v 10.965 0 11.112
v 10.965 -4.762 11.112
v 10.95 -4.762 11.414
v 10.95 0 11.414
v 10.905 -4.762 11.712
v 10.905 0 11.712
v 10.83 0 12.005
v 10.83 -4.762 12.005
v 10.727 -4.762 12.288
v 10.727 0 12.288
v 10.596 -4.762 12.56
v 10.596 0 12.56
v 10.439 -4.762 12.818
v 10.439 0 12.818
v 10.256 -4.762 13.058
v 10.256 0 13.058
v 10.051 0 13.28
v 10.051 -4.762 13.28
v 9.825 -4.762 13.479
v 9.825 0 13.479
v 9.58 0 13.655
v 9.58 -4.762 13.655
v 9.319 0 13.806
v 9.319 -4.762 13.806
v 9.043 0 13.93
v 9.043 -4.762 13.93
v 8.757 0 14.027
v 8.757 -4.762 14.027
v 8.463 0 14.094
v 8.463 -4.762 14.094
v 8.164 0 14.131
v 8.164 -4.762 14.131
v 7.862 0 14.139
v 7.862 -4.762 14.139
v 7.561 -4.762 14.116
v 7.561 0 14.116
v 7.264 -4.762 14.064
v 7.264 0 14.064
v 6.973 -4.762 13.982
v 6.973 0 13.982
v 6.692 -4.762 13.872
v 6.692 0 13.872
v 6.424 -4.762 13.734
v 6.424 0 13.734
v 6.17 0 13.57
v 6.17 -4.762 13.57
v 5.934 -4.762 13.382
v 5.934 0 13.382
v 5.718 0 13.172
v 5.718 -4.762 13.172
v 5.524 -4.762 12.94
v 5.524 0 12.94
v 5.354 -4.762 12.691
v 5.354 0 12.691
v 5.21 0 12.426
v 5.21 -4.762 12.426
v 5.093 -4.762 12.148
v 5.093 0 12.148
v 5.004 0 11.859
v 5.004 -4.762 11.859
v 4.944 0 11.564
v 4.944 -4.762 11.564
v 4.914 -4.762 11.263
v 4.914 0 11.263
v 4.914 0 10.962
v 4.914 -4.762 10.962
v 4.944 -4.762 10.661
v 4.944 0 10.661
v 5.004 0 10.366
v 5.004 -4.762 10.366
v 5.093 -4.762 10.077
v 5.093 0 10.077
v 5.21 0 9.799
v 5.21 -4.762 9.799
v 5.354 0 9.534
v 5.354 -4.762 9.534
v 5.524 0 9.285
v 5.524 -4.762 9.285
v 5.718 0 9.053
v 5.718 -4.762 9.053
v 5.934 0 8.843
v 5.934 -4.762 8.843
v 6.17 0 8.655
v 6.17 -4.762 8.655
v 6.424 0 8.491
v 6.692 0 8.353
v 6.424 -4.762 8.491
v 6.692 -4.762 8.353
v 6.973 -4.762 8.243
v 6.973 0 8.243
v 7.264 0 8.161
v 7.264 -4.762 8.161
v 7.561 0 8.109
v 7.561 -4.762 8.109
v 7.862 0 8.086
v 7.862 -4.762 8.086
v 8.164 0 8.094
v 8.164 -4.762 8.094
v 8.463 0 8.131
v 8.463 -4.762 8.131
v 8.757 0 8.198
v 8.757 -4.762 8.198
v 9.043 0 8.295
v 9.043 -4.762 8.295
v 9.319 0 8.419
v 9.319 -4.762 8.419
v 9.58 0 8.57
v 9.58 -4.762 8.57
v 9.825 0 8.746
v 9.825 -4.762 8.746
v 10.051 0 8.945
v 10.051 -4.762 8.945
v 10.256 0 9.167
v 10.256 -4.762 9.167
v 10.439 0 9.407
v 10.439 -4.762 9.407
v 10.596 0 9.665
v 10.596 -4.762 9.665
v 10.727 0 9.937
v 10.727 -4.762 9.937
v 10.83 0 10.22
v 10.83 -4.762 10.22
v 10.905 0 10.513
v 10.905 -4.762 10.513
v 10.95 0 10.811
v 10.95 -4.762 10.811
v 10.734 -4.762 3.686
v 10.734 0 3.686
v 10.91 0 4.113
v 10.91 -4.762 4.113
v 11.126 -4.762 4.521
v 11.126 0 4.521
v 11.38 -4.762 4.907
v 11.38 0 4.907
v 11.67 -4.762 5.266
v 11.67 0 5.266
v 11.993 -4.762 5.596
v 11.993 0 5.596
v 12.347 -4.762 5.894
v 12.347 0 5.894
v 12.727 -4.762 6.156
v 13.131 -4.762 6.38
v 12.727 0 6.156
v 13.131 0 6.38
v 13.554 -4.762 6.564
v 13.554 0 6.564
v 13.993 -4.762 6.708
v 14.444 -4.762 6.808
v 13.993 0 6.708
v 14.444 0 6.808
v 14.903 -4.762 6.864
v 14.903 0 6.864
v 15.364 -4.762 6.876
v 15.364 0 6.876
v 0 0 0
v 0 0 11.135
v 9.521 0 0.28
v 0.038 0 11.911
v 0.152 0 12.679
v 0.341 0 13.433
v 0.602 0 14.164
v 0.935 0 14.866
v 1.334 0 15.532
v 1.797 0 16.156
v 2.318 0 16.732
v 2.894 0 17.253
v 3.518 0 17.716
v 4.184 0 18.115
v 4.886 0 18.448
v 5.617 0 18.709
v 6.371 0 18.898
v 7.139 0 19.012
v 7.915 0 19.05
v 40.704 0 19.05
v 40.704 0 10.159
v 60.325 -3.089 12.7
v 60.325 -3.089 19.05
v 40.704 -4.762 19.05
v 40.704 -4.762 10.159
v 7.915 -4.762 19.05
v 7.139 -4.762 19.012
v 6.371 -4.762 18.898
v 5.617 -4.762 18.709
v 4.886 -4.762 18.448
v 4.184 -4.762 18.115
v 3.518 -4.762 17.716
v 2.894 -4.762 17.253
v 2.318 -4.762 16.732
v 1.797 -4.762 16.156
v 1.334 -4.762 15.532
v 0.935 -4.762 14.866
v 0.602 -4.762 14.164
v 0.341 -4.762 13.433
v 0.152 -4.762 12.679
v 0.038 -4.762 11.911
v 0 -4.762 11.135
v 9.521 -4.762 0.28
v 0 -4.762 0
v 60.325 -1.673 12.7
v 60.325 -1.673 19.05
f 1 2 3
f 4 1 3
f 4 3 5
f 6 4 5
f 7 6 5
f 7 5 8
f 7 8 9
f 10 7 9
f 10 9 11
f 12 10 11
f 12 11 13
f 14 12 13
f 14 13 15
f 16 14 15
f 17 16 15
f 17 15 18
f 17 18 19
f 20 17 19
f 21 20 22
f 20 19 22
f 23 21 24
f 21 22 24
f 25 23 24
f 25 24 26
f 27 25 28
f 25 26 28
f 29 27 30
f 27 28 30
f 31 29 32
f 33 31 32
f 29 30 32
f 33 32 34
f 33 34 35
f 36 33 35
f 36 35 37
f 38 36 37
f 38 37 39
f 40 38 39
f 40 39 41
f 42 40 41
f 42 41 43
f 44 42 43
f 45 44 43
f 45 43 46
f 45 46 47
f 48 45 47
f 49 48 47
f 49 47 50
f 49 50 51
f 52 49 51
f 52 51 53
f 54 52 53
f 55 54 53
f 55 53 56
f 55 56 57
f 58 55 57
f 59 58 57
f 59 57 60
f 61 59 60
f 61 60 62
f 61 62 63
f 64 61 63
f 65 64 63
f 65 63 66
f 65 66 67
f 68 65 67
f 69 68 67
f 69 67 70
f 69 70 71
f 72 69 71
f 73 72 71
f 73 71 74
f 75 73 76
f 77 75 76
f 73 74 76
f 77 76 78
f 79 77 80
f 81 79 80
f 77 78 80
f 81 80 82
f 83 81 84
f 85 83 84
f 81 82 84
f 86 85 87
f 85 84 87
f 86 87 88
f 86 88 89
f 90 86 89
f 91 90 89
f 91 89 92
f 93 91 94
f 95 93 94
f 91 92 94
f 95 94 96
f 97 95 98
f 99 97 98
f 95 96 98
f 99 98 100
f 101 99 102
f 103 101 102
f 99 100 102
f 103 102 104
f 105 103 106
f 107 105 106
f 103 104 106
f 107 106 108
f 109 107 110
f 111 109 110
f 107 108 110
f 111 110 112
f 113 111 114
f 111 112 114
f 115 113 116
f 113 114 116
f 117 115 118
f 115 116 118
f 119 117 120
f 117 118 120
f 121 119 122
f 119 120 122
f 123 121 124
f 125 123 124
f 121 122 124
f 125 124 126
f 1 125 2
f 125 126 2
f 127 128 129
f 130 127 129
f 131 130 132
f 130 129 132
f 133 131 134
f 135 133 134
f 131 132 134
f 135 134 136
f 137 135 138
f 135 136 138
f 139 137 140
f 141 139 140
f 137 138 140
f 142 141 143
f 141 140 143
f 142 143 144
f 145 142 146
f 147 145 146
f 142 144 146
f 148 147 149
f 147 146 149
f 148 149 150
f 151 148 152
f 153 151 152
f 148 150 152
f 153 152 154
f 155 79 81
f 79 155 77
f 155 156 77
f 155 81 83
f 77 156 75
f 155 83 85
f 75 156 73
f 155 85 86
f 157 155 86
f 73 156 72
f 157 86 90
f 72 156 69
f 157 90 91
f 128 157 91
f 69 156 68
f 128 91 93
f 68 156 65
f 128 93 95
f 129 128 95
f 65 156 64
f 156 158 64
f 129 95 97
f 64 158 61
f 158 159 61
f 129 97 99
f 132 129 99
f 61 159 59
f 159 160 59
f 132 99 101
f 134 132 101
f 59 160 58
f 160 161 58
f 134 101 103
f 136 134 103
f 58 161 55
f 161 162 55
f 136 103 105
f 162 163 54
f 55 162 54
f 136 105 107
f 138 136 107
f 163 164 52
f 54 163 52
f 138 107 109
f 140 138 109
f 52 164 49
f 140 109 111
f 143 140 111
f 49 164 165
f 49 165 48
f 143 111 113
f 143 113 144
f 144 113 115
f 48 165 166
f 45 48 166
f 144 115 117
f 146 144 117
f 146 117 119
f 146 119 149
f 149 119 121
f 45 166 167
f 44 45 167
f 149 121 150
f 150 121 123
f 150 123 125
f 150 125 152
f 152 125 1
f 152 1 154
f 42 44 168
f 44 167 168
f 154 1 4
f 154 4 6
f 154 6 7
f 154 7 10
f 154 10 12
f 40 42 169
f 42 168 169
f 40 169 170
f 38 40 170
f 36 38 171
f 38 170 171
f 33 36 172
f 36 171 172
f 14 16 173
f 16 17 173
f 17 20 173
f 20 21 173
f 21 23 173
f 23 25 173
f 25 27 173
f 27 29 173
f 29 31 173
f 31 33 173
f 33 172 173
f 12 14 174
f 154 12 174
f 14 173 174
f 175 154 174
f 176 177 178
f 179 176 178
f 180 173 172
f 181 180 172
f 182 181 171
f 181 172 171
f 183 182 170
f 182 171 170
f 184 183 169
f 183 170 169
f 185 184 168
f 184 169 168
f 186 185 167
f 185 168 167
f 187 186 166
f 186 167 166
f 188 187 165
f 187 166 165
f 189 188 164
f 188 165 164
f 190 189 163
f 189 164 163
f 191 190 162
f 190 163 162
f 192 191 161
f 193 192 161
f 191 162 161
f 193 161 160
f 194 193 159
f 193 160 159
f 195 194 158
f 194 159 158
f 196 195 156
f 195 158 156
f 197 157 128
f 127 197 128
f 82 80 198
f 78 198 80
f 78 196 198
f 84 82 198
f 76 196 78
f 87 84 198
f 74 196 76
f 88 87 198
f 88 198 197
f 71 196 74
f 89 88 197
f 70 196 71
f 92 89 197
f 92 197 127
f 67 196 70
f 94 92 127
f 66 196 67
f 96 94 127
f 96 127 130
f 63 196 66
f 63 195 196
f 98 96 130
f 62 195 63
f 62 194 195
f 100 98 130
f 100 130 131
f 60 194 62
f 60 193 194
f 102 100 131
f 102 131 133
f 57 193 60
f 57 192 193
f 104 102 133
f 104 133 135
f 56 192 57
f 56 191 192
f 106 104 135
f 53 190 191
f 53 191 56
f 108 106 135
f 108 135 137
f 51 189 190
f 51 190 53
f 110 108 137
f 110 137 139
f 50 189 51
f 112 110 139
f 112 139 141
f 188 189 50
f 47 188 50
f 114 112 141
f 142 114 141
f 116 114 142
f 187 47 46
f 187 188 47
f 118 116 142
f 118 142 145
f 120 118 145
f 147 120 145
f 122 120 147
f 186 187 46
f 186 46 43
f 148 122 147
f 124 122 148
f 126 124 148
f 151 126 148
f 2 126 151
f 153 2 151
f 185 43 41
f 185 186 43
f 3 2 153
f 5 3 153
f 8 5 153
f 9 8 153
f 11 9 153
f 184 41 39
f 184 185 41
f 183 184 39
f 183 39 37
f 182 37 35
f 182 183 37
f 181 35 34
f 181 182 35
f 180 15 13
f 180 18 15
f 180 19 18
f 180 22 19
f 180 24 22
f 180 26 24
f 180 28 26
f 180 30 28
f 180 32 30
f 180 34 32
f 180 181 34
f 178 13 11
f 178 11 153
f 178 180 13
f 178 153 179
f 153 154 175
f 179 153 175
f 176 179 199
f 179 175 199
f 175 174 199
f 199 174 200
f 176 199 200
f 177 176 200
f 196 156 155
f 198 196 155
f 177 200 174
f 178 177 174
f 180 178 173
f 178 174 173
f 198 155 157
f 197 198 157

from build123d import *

# Parameters (mm, degrees)
F1_DEPTH = 4.7625
F2_R     = 3.027234
F3_DEPTH = 25.4
F5_DEPTH = 25.4


with BuildPart() as f1:
    # F0 (on Front) → F1 (new body)
    with BuildSketch(Plane.XZ):
        with BuildLine():
            Line((60.325, 19.05), (7.914832, 19.05))
            ThreePointArc((7.914832, 19.05), (2.318201, 16.731799), (0, 11.135168))
            Line((0, 11.135168), (0, 0))
            Line((0, 0), (9.520886, 0.27992))
            Line((9.520886, 0.27992), (10.734157, 3.685592))
            ThreePointArc((10.734157, 3.685592), (12.533664, 6.029149), (15.364371, 6.876249))
            Line((15.364371, 6.876249), (60.325, 12.7))
            Line((60.325, 12.7), (60.325, 19.05))
        make_face()
    extrude(amount=F1_DEPTH)

    # F2 (on face) → F3 (cut)
    with BuildSketch(Plane.XZ.offset(4.7625)):
        with Locations((7.937468, 11.1125)):
            Circle(F2_R)
    extrude(amount=-F3_DEPTH, mode=Mode.SUBTRACT)

    # F4 (on face) → F5 (cut)
    with BuildSketch(Plane.XY.offset(19.05)):
        Polygon((40.704425, 0), (60.325, -1.673274), (60.325, 0), align=None)
        Polygon((60.325, -4.7625), (60.325, -3.089226), (40.704425, -4.7625), align=None)
    extrude(amount=-F5_DEPTH, mode=Mode.SUBTRACT)


solid = f1.part
